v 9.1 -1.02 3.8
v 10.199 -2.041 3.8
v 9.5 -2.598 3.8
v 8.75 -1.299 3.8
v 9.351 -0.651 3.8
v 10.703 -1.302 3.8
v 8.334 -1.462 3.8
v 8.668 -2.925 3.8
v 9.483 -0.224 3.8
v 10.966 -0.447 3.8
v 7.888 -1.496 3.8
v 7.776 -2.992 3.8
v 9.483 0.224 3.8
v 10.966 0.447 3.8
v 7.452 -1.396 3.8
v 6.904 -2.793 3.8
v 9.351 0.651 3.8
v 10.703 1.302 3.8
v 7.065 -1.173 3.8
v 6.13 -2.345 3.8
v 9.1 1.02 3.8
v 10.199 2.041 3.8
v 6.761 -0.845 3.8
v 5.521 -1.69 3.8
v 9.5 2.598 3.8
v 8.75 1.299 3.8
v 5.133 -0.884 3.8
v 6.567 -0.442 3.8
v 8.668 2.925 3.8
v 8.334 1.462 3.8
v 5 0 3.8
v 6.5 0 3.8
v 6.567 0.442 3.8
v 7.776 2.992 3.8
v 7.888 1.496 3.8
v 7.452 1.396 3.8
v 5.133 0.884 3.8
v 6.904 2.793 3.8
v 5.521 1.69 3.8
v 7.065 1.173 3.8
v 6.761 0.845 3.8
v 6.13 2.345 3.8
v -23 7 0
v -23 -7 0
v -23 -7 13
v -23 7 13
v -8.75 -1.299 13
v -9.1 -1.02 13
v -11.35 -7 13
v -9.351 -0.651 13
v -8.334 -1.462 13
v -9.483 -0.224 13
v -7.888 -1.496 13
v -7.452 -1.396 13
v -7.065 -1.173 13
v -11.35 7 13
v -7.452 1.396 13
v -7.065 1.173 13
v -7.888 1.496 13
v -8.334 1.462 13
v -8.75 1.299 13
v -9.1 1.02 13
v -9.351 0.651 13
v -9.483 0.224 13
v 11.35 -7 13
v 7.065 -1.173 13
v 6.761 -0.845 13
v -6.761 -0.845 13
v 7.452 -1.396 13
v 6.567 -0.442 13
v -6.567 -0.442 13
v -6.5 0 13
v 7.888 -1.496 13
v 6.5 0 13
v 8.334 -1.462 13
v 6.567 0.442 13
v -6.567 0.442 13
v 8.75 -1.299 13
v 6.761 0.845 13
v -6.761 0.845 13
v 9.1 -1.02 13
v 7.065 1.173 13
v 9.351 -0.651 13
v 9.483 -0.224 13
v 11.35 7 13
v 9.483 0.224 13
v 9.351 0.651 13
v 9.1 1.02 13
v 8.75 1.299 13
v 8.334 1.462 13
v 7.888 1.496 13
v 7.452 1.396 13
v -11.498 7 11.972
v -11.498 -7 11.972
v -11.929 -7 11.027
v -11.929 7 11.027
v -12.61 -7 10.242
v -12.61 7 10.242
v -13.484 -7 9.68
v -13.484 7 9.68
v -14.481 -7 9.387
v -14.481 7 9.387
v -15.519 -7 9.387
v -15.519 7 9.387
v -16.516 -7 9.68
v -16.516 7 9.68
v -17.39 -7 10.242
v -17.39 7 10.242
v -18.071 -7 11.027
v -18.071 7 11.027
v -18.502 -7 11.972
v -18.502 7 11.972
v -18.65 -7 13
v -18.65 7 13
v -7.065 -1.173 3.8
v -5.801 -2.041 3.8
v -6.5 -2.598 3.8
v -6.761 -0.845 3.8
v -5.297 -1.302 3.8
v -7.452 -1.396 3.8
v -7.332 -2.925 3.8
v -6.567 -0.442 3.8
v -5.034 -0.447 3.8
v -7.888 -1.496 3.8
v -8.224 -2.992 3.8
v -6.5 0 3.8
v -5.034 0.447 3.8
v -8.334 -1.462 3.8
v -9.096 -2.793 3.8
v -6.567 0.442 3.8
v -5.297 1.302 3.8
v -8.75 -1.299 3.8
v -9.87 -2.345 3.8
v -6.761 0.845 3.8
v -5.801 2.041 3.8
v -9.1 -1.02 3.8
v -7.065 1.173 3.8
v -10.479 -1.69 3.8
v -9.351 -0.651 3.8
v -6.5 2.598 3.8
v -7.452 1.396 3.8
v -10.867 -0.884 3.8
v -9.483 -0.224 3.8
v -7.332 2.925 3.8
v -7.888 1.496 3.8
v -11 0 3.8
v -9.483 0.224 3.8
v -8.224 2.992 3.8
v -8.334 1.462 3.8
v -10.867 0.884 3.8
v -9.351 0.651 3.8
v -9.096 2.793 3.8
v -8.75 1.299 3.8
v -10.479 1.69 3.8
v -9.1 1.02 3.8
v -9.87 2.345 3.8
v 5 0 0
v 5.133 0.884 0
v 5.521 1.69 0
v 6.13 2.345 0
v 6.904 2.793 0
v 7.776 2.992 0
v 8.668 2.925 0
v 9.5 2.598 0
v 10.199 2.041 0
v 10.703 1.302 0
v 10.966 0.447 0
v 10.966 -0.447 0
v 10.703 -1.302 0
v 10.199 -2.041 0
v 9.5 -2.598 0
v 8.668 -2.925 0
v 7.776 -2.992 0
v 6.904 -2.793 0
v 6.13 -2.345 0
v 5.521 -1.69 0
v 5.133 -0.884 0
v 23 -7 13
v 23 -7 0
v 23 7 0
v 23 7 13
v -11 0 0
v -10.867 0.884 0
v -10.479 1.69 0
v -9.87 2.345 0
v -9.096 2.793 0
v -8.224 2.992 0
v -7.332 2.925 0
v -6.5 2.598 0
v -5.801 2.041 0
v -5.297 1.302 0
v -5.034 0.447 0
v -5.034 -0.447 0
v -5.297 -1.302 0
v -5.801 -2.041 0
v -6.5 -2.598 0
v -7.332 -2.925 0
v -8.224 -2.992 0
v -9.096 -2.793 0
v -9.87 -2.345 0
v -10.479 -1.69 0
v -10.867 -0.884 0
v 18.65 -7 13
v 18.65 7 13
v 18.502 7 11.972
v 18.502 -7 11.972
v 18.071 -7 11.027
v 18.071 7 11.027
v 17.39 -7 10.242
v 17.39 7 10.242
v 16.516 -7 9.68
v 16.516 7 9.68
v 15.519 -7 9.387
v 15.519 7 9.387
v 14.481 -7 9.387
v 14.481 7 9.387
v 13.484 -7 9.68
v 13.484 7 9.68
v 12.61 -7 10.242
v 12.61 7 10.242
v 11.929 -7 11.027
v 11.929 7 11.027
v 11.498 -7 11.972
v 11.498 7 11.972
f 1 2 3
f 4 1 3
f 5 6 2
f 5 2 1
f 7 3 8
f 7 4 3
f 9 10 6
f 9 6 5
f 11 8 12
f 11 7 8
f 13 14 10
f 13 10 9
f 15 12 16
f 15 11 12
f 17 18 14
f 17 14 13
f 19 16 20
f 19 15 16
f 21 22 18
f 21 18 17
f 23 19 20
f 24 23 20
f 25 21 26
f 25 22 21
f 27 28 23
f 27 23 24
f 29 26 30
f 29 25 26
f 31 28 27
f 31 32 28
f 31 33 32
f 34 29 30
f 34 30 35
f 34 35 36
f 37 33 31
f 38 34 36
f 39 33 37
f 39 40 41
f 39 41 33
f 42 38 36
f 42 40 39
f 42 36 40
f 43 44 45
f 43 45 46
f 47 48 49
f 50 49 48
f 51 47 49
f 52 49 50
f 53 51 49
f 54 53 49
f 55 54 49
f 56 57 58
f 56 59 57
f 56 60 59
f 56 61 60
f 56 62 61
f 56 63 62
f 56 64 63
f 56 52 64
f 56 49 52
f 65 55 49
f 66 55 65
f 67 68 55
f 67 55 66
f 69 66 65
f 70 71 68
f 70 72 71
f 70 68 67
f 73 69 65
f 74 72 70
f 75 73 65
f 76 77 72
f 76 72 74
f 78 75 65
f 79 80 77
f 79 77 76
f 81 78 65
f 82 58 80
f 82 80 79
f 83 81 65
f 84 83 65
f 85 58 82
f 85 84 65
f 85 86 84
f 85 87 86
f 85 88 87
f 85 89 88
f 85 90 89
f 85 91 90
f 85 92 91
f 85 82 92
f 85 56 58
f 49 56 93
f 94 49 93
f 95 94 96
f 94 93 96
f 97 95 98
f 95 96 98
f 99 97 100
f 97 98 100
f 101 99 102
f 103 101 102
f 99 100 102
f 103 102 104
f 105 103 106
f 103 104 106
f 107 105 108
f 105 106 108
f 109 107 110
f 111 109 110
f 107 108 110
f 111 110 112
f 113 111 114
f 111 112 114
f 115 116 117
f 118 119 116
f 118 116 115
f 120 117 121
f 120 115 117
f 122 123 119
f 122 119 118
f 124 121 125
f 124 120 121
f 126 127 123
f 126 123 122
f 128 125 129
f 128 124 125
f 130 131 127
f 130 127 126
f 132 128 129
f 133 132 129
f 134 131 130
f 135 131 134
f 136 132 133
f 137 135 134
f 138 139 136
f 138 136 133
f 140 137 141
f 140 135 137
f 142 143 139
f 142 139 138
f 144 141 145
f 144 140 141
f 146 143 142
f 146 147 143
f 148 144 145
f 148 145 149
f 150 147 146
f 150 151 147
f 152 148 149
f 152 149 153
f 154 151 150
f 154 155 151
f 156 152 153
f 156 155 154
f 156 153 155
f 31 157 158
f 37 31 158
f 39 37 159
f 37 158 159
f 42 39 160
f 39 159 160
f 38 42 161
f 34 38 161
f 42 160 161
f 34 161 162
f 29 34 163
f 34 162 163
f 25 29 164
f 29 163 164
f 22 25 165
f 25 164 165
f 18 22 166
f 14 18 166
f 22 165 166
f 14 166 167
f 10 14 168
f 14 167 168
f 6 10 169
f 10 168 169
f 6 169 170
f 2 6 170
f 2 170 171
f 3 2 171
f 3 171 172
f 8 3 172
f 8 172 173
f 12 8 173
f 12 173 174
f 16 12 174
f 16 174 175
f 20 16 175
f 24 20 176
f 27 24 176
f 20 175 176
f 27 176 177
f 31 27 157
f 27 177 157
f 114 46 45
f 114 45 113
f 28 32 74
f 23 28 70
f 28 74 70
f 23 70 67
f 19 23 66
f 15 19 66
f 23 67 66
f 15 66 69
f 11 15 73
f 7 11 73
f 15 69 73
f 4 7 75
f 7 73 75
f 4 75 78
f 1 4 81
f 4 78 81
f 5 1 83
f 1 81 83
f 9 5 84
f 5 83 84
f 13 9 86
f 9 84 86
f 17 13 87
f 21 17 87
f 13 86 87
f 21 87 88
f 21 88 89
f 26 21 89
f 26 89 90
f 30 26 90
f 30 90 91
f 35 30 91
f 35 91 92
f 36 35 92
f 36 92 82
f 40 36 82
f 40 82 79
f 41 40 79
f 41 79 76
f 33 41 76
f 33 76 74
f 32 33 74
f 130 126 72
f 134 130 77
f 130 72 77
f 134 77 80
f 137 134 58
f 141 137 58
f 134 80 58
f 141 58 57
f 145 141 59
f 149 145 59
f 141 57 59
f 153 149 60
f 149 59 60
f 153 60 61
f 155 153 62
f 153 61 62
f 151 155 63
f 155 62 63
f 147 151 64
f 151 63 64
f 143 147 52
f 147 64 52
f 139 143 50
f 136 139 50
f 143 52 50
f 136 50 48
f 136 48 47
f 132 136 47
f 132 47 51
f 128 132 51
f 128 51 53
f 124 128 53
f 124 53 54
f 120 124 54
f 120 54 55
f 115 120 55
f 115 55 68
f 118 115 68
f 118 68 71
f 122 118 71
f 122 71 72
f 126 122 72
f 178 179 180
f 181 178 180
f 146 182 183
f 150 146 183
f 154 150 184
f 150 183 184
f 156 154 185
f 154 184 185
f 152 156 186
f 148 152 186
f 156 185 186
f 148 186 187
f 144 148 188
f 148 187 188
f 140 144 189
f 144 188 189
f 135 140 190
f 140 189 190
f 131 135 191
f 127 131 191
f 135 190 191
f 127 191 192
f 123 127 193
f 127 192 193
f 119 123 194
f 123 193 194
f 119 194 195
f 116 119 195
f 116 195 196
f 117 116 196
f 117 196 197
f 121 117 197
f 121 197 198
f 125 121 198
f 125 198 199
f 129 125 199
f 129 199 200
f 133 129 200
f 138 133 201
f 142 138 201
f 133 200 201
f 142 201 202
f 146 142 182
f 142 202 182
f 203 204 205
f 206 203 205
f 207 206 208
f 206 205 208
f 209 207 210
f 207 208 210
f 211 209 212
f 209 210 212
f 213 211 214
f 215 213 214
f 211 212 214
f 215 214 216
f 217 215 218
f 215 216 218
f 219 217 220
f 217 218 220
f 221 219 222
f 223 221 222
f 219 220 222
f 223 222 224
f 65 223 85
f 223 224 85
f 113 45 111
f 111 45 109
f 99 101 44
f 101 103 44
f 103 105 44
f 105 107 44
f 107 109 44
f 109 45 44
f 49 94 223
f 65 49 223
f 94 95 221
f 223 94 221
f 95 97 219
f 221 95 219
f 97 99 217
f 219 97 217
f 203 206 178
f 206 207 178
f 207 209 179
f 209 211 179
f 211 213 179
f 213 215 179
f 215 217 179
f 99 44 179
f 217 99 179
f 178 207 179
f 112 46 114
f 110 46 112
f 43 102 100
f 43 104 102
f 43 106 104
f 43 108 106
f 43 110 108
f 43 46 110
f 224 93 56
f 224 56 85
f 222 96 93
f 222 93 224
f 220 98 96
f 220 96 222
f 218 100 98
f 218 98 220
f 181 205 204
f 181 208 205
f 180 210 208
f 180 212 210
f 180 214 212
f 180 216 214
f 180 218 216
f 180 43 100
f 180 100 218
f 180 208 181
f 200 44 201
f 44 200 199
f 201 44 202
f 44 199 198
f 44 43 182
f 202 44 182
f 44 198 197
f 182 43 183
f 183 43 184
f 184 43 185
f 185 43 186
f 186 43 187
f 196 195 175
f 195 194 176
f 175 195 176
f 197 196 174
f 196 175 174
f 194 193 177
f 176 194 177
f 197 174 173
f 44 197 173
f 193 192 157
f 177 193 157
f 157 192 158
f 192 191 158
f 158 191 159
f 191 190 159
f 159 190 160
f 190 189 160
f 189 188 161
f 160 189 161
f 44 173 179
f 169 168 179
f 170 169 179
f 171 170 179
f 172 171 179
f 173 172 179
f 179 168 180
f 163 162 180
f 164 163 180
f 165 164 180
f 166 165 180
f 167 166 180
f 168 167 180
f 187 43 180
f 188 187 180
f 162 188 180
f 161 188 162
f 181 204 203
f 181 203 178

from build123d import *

# Parameters (mm, degrees)
SKETCH_1_W          = 46
SKETCH_1_H          = 14
EXTRUDE_1_DEPTH     = 13
CUT_EXTRUDE_1_REACH = 29.331
SKETCH_2_R          = 1.5
CUT_EXTRUDE_2_REACH = 31.9
SKETCH_3_R          = 3.65
SKETCH_4_R          = 3
CUT_EXTRUDE_3_DEPTH = 3.8


with BuildPart() as part:
    # Эскиз1 → Бобышка-Вытянуть1 (new body)
    with BuildSketch(Plane.XY):
        Rectangle(SKETCH_1_W, SKETCH_1_H)
    extrude(amount=EXTRUDE_1_DEPTH)

    # Эскиз2 → Вырез-Вытянуть1 (cut, up to next)
    with BuildSketch(Plane.XY.offset(13), mode=Mode.PRIVATE) as cut_extrude_1_sk1:
        with Locations((-8, 0)):
            Circle(SKETCH_2_R)
    cut_extrude_1_tool1 = extrude(cut_extrude_1_sk1.sketch, amount=-CUT_EXTRUDE_1_REACH, mode=Mode.PRIVATE) & part.part
    # Эскиз2 → Вырез-Вытянуть1 (cut, up to next)
    with BuildSketch(Plane.XY.offset(13), mode=Mode.PRIVATE) as cut_extrude_1_sk2:
        with Locations(Location((8, 0, 0), (0, 0, 180))):
            Circle(SKETCH_2_R)
    cut_extrude_1_tool2 = extrude(cut_extrude_1_sk2.sketch, amount=-CUT_EXTRUDE_1_REACH, mode=Mode.PRIVATE) & part.part
    add(cut_extrude_1_tool1.solids().sort_by_distance((-8, 0, 13))[0], mode=Mode.SUBTRACT)
    add(cut_extrude_1_tool2.solids().sort_by_distance((8, 0, 13))[0], mode=Mode.SUBTRACT)

    # Эскиз3 → Вырез-Вытянуть2 (cut, up to next)
    with BuildSketch(Plane(origin=(0, 7, 0), x_dir=(1, 0, 0), z_dir=(0, 1, 0)), mode=Mode.PRIVATE) as cut_extrude_2_sk1:
        with Locations((-15, -13)):
            Circle(SKETCH_3_R)
    cut_extrude_2_tool1 = extrude(cut_extrude_2_sk1.sketch, amount=-CUT_EXTRUDE_2_REACH, mode=Mode.PRIVATE) & part.part
    # Эскиз3 → Вырез-Вытянуть2 (cut, up to next)
    with BuildSketch(Plane(origin=(0, 7, 0), x_dir=(1, 0, 0), z_dir=(0, 1, 0)), mode=Mode.PRIVATE) as cut_extrude_2_sk2:
        with Locations((15, -13)):
            Circle(SKETCH_3_R)
    cut_extrude_2_tool2 = extrude(cut_extrude_2_sk2.sketch, amount=-CUT_EXTRUDE_2_REACH, mode=Mode.PRIVATE) & part.part
    add(cut_extrude_2_tool1.solids().sort_by_distance((-15, 7, 13))[0], mode=Mode.SUBTRACT)
    add(cut_extrude_2_tool2.solids().sort_by_distance((15, 7, 13))[0], mode=Mode.SUBTRACT)

    # Эскиз4 → Вырез-Вытянуть3 (cut)
    with BuildSketch(Plane(origin=(0, 0, 0), x_dir=(-1, 0, 0), z_dir=(0, 0, -1))):
        with Locations((-8, 0)):
            Circle(SKETCH_4_R)
        with Locations((8, 0)):
            Circle(SKETCH_4_R)
    extrude(amount=-CUT_EXTRUDE_3_DEPTH, mode=Mode.SUBTRACT)


solid = part.part
